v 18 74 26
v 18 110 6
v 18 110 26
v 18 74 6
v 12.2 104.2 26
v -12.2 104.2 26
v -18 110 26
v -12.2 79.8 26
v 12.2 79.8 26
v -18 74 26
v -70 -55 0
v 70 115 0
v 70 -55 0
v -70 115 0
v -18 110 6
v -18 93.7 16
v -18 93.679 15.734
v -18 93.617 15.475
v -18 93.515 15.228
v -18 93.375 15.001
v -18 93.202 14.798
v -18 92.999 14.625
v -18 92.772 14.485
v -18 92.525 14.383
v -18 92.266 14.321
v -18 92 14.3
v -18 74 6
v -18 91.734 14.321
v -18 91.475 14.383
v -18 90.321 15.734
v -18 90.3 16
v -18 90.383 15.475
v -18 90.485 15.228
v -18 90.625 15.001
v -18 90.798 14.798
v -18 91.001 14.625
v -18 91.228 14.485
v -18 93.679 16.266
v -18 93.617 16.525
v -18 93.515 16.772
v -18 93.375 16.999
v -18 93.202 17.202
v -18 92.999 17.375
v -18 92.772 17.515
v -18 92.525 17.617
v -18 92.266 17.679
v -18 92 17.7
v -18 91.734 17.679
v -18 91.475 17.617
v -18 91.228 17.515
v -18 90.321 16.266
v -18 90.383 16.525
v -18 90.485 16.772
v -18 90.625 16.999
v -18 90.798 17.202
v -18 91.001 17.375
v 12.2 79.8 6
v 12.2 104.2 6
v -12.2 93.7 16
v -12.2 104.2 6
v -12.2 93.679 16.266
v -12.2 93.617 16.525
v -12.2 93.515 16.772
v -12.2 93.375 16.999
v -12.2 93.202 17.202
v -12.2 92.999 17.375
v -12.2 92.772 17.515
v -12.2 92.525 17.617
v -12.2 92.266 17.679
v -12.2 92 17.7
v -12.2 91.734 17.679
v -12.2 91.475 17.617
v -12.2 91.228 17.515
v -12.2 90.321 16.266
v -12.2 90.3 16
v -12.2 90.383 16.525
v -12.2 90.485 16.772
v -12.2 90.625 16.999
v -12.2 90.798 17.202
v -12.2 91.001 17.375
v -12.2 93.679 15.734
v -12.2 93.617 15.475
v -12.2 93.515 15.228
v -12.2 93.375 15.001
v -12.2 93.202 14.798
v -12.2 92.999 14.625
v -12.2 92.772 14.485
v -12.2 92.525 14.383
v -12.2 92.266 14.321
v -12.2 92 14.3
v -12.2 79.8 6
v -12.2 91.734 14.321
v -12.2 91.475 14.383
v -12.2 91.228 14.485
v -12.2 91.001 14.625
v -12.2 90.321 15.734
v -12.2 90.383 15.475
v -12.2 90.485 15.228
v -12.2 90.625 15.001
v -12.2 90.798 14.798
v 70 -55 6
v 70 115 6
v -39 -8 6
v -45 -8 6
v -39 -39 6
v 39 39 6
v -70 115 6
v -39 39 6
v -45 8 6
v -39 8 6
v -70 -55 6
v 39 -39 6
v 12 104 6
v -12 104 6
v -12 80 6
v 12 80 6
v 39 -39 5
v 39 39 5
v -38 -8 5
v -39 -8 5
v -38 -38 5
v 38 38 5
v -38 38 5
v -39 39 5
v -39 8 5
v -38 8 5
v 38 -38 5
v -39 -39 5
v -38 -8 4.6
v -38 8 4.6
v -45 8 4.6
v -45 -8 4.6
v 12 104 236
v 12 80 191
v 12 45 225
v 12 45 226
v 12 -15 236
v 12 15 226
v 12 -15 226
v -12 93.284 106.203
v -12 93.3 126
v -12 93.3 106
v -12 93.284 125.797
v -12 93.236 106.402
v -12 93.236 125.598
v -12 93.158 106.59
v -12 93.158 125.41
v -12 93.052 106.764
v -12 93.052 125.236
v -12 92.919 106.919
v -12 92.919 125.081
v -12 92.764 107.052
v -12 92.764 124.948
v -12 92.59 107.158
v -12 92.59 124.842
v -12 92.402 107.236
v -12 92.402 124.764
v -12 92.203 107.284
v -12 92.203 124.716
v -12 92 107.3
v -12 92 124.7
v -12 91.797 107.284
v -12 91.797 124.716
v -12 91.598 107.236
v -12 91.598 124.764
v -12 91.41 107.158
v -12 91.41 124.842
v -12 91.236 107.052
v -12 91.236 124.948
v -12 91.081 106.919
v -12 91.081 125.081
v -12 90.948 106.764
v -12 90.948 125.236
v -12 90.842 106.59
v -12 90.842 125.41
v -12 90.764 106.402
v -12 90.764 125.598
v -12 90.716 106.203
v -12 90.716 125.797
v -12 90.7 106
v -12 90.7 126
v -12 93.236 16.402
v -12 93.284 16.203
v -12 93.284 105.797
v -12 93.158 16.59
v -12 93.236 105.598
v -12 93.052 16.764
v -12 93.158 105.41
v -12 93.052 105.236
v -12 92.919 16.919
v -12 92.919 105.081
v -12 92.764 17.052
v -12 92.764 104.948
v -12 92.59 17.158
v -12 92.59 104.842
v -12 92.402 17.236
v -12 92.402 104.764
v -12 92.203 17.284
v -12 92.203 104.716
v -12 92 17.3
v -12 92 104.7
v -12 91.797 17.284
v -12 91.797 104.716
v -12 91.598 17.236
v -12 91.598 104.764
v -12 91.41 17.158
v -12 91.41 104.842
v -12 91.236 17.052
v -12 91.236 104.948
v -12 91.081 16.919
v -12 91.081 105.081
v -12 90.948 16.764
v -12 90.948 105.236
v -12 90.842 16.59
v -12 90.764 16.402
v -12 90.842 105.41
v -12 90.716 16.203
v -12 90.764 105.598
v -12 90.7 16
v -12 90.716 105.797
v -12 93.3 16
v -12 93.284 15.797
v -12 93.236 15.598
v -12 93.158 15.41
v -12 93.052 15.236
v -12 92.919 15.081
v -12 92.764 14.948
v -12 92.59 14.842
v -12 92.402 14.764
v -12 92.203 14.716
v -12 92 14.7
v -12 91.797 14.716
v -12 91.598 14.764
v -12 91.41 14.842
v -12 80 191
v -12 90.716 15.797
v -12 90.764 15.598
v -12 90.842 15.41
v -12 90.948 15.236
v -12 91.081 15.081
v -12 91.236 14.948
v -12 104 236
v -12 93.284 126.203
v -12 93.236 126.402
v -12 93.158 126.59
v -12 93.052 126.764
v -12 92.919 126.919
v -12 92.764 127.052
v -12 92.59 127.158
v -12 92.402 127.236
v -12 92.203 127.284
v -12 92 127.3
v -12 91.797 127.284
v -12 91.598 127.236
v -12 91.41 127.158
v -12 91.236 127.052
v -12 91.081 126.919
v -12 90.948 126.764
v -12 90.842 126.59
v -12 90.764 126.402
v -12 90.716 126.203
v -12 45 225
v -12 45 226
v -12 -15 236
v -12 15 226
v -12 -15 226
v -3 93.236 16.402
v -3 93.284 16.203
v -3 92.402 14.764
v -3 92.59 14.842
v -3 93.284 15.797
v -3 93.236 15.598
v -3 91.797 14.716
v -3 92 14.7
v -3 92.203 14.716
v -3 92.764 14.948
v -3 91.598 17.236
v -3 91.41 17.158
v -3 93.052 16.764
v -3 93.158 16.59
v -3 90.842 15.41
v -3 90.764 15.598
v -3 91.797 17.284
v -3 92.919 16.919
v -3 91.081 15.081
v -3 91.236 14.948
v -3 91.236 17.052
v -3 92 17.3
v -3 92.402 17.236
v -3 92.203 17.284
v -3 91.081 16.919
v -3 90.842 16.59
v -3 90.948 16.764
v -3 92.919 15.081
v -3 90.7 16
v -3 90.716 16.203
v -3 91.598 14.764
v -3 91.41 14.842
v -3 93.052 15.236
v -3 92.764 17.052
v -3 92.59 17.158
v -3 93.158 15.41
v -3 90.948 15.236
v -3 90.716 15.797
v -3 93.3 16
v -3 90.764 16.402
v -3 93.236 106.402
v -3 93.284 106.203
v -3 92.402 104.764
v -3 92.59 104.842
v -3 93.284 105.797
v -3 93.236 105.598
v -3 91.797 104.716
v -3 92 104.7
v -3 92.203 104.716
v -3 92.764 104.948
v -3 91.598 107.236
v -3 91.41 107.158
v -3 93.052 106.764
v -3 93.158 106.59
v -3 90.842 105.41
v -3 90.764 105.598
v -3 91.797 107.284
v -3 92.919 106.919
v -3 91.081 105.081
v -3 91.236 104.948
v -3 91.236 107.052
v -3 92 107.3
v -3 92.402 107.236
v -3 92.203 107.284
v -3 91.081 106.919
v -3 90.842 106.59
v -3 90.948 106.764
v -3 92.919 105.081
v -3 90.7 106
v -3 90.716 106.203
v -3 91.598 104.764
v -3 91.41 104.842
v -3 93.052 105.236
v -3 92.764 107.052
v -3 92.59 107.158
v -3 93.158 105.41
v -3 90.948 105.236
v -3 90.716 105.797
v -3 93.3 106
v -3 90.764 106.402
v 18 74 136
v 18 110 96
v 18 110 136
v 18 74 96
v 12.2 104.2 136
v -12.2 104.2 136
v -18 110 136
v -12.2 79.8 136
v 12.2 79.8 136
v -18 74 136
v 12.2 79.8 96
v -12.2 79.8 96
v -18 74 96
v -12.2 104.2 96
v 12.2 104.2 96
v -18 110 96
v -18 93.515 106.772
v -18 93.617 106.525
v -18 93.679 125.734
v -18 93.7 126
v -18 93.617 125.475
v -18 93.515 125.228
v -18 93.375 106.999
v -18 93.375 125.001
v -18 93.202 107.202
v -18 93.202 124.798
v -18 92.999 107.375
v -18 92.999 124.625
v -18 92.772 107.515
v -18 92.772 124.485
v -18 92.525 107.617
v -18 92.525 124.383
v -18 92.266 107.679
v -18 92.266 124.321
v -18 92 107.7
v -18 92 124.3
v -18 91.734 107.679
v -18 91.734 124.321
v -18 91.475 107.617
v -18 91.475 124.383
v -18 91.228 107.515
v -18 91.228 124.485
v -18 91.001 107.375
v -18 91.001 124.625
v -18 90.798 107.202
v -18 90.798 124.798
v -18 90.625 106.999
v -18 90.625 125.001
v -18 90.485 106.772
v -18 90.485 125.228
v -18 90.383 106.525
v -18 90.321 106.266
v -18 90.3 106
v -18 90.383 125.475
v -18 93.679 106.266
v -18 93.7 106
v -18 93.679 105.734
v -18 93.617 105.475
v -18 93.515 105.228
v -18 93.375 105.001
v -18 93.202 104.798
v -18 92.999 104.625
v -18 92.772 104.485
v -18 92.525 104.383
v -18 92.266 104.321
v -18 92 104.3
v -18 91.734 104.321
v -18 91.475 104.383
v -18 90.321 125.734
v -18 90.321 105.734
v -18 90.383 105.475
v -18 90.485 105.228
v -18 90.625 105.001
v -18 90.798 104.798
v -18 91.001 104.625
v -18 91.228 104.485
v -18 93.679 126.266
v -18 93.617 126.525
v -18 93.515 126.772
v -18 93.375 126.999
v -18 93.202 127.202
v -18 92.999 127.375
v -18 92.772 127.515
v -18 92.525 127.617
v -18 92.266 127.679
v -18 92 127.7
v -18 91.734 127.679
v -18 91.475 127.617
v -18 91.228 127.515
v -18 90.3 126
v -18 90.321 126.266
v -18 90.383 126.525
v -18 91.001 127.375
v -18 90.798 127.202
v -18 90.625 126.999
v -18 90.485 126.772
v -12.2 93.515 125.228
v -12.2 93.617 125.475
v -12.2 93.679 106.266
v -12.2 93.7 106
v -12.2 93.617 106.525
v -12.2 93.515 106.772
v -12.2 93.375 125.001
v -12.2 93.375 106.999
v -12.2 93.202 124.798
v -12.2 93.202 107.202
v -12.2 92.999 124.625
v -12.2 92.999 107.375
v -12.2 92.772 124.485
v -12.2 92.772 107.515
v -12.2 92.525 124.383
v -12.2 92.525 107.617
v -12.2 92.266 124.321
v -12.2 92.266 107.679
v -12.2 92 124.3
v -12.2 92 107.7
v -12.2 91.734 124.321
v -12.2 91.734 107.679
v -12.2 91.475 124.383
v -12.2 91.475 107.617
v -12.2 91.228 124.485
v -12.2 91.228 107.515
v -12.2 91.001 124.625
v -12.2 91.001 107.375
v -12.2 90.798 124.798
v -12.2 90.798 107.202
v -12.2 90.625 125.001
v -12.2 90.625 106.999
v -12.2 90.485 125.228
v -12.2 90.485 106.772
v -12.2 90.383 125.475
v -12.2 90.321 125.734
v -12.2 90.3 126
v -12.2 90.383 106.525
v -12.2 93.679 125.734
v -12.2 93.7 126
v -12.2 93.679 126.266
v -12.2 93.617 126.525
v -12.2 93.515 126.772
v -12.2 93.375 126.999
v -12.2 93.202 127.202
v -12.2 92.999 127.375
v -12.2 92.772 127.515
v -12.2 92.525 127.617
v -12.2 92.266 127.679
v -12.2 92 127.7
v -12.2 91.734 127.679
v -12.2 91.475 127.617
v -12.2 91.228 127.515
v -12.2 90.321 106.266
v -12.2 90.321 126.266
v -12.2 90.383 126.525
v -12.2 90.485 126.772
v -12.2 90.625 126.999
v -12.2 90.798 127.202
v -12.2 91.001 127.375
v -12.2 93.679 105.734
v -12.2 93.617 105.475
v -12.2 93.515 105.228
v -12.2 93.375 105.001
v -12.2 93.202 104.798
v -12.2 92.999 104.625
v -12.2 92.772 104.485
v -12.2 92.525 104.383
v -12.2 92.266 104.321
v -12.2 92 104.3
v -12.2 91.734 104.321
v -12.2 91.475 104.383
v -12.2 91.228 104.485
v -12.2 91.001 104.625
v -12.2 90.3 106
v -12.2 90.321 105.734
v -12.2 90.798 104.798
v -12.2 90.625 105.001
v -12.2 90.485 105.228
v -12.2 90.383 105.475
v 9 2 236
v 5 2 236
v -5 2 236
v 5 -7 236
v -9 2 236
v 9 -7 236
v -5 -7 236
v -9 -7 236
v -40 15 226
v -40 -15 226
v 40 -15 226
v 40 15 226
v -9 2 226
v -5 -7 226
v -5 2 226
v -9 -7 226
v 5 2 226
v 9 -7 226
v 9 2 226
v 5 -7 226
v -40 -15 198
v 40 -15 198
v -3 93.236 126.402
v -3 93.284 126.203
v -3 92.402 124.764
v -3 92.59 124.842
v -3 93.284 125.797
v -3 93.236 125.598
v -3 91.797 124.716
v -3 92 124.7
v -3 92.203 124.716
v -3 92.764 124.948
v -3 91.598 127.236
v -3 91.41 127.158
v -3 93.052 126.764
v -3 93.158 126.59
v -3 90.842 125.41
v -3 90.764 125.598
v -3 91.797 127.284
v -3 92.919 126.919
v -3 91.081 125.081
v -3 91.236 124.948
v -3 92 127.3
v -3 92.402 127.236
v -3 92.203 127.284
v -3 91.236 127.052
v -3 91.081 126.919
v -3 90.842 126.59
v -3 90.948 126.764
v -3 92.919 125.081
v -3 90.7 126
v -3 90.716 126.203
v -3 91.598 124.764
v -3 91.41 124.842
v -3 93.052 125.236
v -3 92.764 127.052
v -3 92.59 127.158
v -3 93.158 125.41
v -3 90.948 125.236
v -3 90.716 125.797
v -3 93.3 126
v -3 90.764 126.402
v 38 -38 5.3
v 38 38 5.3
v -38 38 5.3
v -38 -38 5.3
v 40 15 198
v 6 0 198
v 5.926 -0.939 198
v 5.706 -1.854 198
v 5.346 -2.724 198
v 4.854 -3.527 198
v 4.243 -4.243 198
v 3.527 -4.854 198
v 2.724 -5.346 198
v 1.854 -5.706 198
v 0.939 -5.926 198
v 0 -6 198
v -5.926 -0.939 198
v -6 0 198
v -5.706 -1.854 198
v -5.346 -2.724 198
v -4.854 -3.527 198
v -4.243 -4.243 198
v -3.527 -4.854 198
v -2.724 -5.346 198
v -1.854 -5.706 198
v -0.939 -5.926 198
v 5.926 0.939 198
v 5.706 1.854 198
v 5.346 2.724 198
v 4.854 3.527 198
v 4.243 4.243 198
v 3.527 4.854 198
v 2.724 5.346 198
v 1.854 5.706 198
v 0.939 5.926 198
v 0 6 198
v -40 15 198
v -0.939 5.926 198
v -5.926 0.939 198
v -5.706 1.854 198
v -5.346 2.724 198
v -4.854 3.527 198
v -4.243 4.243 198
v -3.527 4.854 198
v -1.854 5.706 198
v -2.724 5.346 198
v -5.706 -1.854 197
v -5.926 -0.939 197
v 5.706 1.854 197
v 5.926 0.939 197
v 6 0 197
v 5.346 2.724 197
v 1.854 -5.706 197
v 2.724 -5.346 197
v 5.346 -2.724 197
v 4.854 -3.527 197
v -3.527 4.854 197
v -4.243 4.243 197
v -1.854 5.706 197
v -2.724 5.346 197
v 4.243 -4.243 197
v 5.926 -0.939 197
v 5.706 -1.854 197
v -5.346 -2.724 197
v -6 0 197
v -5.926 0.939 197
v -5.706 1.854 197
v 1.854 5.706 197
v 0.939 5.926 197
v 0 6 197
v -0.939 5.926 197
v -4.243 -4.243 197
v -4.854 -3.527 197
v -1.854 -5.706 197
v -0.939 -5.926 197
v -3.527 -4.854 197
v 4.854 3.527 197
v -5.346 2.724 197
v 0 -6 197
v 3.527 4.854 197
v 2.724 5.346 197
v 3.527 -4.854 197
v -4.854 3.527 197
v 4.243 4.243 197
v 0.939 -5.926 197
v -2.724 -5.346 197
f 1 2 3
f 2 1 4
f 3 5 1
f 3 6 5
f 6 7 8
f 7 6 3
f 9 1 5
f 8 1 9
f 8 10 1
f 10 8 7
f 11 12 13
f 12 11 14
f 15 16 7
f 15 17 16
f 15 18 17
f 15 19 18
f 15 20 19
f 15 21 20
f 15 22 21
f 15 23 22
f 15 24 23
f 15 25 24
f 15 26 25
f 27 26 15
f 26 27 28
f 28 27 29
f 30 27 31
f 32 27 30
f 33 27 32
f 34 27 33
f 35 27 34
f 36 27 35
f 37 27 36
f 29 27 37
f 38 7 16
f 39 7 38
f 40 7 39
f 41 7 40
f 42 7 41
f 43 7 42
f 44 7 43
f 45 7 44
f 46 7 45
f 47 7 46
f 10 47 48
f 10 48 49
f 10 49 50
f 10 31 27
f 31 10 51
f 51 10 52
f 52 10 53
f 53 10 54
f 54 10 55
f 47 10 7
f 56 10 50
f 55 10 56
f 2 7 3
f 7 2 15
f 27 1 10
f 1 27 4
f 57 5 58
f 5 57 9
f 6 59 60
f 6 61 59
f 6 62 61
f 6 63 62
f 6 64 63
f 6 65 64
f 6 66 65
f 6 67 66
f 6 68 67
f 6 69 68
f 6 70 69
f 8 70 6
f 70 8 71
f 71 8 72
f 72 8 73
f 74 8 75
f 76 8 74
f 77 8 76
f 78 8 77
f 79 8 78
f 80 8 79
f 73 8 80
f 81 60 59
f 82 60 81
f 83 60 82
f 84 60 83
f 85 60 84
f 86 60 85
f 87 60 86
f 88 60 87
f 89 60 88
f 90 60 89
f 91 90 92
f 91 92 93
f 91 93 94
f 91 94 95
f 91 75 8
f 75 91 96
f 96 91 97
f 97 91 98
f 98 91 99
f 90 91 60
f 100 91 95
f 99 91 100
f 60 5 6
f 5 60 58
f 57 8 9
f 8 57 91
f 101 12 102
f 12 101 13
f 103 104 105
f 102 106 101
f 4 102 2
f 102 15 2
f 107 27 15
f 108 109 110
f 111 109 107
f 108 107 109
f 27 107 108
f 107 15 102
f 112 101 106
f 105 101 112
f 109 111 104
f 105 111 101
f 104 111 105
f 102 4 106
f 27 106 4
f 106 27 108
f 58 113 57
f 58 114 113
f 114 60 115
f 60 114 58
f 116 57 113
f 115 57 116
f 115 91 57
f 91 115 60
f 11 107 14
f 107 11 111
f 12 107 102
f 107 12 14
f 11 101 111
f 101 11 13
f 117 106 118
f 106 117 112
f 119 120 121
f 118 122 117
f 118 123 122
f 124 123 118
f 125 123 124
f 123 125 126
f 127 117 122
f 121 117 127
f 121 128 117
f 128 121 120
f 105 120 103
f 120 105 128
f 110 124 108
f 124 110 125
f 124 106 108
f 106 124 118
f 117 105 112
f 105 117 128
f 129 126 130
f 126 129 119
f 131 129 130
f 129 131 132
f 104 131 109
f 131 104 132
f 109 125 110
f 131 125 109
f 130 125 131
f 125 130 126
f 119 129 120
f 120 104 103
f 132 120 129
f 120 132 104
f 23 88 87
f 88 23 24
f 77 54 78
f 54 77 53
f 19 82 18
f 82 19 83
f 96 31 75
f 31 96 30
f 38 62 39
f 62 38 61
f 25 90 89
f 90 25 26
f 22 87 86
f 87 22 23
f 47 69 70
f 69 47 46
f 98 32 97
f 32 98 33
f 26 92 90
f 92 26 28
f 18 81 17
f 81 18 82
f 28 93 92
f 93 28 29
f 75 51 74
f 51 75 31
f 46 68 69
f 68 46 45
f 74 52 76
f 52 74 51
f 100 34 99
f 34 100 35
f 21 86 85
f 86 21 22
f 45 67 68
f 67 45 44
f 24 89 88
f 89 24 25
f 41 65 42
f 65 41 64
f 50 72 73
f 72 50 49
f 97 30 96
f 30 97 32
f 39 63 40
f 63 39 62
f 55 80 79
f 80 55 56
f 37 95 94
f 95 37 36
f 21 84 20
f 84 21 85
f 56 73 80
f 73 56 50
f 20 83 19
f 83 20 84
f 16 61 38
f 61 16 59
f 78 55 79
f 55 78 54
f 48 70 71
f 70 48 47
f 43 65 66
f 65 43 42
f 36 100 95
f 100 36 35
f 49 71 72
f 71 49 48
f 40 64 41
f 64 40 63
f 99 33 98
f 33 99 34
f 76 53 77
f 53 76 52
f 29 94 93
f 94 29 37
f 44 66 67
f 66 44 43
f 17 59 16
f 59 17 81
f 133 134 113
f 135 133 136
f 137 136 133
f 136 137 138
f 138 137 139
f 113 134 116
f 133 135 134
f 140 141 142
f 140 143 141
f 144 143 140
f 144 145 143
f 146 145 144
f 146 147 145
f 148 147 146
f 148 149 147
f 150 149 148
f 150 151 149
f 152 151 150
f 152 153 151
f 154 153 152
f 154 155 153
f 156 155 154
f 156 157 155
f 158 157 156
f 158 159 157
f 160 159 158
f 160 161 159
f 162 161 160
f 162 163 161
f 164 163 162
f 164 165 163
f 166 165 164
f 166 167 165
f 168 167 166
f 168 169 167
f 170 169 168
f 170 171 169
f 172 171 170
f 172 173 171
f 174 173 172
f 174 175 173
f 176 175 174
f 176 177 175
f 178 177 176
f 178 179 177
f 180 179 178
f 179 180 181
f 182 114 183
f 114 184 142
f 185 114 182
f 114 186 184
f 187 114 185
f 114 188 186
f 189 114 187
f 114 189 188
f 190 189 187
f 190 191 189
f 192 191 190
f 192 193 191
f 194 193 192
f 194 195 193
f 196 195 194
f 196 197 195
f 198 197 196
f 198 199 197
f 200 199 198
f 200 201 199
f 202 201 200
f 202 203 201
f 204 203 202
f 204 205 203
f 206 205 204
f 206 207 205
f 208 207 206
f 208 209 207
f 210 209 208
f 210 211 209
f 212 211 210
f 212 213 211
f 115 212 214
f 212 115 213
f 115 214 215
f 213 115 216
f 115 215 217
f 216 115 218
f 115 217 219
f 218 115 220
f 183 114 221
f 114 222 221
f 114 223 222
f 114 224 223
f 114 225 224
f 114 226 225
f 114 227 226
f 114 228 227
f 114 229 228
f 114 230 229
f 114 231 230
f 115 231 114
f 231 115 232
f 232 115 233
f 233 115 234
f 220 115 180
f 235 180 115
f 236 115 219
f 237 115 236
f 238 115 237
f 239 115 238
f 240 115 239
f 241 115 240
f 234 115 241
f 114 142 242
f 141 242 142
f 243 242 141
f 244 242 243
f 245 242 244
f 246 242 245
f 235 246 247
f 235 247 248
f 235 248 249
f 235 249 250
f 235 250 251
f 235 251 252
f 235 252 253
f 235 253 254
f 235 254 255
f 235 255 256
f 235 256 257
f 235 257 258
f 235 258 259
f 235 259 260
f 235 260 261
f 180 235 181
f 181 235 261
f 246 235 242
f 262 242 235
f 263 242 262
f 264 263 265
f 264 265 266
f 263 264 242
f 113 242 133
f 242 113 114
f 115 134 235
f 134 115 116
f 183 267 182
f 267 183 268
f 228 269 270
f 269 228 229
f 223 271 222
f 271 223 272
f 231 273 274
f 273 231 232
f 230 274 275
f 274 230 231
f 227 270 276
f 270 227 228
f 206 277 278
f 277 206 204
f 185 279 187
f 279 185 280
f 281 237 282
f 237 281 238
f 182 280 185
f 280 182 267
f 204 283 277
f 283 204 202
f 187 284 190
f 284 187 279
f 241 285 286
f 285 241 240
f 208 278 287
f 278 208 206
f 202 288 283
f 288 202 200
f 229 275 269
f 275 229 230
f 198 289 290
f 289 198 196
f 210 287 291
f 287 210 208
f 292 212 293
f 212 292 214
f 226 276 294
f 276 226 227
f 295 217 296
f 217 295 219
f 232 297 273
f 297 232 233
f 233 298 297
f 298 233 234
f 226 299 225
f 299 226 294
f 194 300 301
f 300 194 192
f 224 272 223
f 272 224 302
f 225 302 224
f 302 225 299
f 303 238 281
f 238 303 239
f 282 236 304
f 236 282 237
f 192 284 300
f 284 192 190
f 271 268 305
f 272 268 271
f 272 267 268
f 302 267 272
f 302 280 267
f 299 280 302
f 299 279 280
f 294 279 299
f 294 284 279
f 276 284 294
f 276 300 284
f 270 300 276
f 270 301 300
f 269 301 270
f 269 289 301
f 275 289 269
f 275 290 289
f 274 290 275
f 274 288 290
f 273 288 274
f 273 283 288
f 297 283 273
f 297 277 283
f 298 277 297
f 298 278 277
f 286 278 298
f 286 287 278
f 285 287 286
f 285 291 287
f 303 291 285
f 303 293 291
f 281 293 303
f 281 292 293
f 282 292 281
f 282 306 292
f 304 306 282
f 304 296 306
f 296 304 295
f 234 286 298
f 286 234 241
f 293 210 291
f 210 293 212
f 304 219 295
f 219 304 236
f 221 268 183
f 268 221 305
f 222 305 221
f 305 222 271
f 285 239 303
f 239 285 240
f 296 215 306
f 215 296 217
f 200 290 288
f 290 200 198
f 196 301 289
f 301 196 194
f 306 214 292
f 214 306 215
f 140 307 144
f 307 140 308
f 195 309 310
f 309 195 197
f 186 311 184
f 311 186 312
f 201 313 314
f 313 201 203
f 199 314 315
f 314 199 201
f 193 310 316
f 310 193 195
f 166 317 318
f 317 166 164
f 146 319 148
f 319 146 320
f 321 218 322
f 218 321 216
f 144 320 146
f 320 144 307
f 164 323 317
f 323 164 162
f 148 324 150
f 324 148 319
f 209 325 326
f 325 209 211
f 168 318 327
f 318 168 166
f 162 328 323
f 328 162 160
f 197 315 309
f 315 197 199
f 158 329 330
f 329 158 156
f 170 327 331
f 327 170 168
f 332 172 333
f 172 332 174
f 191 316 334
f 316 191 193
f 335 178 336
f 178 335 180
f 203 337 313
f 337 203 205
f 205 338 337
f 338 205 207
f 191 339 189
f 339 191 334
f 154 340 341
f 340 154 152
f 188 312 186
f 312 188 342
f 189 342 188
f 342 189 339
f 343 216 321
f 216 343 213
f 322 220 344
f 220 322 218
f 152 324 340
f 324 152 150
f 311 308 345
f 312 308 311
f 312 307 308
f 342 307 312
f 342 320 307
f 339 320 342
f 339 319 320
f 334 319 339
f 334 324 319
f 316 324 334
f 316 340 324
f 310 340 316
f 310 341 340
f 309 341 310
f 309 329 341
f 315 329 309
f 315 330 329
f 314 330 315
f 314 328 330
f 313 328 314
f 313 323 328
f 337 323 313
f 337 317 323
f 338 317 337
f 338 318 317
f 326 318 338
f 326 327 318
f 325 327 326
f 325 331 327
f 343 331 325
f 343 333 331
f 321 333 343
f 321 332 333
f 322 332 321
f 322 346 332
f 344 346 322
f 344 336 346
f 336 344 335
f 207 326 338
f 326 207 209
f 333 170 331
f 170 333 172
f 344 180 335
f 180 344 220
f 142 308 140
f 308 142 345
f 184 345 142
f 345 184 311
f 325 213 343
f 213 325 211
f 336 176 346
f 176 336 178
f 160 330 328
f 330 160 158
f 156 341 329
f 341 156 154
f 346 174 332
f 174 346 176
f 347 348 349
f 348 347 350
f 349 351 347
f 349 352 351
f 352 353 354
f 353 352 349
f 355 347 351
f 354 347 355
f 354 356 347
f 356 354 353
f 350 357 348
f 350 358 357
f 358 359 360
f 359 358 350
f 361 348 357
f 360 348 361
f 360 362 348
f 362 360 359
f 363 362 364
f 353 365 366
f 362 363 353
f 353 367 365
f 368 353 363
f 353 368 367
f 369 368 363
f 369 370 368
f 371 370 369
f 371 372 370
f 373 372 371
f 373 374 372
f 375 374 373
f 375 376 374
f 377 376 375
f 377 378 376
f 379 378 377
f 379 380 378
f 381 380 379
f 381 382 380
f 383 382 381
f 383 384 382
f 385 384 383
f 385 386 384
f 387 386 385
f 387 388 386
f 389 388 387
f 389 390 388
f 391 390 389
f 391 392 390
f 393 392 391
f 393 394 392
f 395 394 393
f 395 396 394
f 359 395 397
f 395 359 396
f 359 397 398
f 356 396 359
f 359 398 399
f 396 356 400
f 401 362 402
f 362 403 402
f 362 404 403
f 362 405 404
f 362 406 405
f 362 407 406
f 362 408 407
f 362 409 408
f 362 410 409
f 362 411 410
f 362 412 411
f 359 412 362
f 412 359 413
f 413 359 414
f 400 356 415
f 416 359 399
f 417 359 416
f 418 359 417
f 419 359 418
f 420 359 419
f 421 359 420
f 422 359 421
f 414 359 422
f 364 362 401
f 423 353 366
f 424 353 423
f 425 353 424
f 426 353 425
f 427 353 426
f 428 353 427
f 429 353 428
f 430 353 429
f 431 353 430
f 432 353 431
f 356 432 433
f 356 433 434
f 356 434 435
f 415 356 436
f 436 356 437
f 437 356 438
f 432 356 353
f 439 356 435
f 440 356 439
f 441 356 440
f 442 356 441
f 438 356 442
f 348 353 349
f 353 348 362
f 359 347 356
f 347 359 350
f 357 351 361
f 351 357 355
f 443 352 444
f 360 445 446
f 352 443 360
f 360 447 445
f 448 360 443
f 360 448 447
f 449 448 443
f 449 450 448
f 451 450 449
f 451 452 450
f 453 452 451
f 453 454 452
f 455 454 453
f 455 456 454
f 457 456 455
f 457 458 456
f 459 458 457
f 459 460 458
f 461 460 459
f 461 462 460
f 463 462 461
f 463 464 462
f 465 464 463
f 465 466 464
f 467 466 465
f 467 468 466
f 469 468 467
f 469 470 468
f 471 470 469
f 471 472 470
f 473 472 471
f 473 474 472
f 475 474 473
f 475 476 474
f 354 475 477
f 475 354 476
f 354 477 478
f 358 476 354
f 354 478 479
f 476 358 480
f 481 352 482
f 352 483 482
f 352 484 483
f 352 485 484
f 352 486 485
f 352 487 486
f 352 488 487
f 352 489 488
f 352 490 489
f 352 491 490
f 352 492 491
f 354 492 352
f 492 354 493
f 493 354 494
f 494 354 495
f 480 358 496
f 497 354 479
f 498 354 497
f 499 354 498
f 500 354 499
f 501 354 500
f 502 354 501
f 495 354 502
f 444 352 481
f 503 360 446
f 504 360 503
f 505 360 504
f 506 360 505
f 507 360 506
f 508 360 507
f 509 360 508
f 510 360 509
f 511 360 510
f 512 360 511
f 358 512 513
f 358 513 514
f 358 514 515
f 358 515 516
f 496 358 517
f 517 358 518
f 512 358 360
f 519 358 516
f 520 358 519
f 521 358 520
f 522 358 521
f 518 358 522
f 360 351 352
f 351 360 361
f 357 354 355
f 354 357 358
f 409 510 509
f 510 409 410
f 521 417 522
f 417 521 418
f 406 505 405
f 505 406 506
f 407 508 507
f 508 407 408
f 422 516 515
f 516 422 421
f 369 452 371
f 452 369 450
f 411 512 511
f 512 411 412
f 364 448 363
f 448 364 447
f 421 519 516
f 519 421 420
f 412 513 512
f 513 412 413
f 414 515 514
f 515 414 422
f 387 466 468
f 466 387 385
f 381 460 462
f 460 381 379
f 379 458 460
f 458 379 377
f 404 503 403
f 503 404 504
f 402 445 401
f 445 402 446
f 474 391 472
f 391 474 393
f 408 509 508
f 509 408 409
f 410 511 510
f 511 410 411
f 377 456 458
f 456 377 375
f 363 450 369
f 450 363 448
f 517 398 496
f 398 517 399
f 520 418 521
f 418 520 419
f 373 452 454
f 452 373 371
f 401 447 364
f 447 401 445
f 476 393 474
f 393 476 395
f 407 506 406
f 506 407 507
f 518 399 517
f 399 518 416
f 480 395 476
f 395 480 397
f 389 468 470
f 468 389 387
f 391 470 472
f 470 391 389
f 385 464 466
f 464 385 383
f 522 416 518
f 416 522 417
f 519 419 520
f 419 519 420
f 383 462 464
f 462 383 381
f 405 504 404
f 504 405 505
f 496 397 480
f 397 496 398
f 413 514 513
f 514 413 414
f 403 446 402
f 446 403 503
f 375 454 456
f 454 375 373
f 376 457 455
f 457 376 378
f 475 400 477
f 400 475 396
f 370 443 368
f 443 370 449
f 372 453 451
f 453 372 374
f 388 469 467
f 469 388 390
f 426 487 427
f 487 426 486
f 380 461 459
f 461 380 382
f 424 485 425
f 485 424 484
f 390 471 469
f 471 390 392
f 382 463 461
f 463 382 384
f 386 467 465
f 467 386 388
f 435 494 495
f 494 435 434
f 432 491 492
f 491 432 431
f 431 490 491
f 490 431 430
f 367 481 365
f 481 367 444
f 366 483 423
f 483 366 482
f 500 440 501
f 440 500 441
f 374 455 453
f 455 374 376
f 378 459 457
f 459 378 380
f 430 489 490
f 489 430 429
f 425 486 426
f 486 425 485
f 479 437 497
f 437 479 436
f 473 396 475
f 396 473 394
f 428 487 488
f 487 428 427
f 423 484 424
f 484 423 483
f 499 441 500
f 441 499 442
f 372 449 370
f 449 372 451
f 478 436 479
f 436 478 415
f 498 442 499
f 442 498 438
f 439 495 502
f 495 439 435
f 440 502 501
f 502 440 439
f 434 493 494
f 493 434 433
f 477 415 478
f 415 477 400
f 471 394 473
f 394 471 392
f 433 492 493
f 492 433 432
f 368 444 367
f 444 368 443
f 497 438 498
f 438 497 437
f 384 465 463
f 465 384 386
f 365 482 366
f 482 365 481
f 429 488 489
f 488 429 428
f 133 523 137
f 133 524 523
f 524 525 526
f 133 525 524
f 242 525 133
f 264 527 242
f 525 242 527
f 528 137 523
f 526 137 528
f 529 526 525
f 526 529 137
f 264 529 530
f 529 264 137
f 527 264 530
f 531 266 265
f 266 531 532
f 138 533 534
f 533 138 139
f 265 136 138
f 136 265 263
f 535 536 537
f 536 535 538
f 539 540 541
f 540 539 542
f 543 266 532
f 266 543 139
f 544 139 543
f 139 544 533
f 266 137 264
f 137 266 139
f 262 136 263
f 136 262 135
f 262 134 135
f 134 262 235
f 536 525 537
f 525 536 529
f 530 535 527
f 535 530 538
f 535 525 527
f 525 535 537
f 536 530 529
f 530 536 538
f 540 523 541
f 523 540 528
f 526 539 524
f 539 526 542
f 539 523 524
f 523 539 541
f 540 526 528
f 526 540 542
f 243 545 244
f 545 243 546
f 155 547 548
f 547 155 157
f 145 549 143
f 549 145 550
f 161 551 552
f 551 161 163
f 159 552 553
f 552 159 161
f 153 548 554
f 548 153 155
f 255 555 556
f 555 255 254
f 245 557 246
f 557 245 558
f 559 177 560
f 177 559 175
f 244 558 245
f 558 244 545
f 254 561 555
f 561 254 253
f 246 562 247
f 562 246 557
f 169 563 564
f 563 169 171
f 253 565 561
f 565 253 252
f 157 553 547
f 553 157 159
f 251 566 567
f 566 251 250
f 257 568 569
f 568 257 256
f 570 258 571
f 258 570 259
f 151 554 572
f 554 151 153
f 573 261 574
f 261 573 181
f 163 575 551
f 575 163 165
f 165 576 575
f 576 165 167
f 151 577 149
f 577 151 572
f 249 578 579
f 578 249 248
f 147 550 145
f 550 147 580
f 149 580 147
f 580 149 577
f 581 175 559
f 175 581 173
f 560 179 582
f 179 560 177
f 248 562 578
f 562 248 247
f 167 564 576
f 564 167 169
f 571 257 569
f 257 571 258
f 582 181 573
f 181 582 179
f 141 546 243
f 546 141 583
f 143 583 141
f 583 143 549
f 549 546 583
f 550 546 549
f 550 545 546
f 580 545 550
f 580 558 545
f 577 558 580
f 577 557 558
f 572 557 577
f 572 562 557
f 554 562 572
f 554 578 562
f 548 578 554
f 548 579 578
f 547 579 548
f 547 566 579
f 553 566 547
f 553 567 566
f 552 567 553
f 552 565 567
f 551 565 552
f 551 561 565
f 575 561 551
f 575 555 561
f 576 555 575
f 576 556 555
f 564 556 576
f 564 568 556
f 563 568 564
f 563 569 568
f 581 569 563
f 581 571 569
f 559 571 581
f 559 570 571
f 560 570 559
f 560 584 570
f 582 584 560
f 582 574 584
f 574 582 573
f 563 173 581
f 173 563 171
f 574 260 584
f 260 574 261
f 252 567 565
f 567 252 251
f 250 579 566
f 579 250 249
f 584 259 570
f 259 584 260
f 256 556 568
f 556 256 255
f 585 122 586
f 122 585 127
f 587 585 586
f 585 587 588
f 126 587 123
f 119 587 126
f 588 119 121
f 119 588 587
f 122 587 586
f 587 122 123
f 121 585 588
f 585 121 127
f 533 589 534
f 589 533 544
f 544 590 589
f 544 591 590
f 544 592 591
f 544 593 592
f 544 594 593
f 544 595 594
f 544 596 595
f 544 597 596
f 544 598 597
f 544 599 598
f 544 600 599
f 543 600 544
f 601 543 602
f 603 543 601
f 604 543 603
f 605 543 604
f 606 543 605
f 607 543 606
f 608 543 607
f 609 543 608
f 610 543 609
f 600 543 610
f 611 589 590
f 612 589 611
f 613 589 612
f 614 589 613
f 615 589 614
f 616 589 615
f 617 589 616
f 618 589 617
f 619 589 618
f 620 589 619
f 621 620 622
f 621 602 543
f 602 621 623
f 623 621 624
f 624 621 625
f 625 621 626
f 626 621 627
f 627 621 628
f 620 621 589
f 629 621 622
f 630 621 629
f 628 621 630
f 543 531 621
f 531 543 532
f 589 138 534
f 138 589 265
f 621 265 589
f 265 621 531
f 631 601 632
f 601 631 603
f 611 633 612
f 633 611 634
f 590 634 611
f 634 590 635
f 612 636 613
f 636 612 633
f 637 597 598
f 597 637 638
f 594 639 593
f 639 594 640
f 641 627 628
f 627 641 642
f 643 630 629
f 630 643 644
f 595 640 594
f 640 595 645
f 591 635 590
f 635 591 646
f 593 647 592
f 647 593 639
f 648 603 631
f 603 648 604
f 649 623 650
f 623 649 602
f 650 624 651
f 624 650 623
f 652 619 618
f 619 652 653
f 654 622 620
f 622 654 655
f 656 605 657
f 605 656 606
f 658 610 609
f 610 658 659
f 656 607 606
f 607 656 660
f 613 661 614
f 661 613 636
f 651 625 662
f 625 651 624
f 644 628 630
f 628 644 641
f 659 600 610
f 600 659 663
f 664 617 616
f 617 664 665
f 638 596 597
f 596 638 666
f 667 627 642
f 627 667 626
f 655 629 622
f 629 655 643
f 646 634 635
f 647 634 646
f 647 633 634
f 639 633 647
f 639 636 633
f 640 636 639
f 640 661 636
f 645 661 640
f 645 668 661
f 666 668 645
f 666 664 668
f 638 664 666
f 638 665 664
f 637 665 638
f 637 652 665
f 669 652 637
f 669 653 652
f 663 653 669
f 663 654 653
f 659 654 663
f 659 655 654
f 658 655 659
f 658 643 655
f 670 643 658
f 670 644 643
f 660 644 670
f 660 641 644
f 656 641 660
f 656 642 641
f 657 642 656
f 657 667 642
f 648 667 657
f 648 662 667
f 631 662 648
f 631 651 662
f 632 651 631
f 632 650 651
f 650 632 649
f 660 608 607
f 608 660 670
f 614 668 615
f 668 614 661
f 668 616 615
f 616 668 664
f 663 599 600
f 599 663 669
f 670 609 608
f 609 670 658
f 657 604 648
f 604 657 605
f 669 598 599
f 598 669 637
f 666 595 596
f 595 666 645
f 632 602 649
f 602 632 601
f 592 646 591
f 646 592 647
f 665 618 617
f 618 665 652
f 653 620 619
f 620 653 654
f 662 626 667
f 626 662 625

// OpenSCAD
// Scribbot camera stand: holds a webcam (Logitech Brio 101) about 19 cm above a sticky note.
// The webcam's own monitor clip grips the end of the top arm. The camera hangs underneath, looking down.
// Parts (print one of each, no supports):
//   21 foot      note pocket + socket for the column (print flat)
//   22 column    lower column (print standing up)
//   23 coupler   joins the column to the top arm (print standing up)
//   24 top_arm   upright + arm, printed lying on its side
// Hardware: 4 x M3 x 12 screws (same as the arm) screwed into the printed columns, 2 zip ties.
part="assembly";
$fn=40;

C=24;          // column square
FIT=0.4;       // socket clearance
NOTE=78;       // pocket for a 76 mm note
COL_Y=92;      // column center, behind the note center
LOW_H=110;     // lower column
SOCK=20;       // socket depth
UP_H=120;      // upright of the top arm
ARM_T=10;      // the "monitor edge" thickness the clip grips
ARM_END=-15;   // arm end edge (y). The camera hangs between here and about y = +15, lens near y = 0.

// Through the socket wall from the -x side (clearance)...
module m3_cross(z){ translate([-C/2-7,0,z]) rotate([0,90,0]) cylinder(d=3.4,h=7.5); }
// ...and into the column (pilot hole, the screw cuts its own thread).
module m3_pilot(z){ translate([-C/2-1,0,z]) rotate([0,90,0]) cylinder(d=2.6,h=10); }

module socket_block(h){
  difference(){
    translate([-C/2-6,-C/2-6,0]) cube([C+12,C+12,h]);
    translate([-(C+FIT)/2,-(C+FIT)/2,-1]) cube([C+FIT,C+FIT,h+2]);
  }
}

module foot(){
  difference(){
    union(){
      translate([-70,-55,0]) cube([140,170,6]);
      translate([0,COL_Y,0]) socket_block(6+SOCK);
    }
    translate([-NOTE/2,-NOTE/2,5]) cube([NOTE,NOTE,2]);              // 1 mm deep note pocket
    translate([-NOTE/2-6,-8,4.6]) cube([7,16,2]);                    // finger notch to lift the note
    translate([0,COL_Y,6+SOCK/2]) m3_cross(0);
  }
  translate([0,COL_Y,0]) translate([-C/2-6,-C/2-6,0]) cube([C+12,C+12,6]);   // socket floor
}

module column(){            // standing, centered, z = 0 at the bottom
  difference(){
    translate([-C/2,-C/2,0]) cube([C,C,LOW_H]);
    m3_pilot(SOCK/2);
    m3_pilot(LOW_H-SOCK/2);
  }
}

module coupler(){ difference(){ socket_block(2*SOCK); m3_cross(SOCK/2); m3_cross(1.5*SOCK); } }

module top_arm_standing(){  // column axis at (0,0), bottom at z = 0
  L=COL_Y-ARM_END;
  difference(){
    union(){
      translate([-C/2,-C/2,0]) cube([C,C,UP_H]);
      translate([-C/2,-L,UP_H-ARM_T]) cube([C,L+C/2,ARM_T]);              // arm toward the note
      hull(){                                                            // gusset
        translate([-C/2,-C/2,UP_H-ARM_T-35]) cube([C,1,35]);
        translate([-C/2,-C/2-35,UP_H-ARM_T-1]) cube([C,35,1]);
      }
    }
    m3_pilot(SOCK/2);
    for(x=[-C/2+3,C/2-7]) translate([x,-L+8,UP_H-ARM_T-1]) cube([4,9,ARM_T+2]);   // zip-tie slots
  }
}

// Lying on its side: standing x becomes print z. All parts of it are C wide, so it sits flat.
module top_arm_print(){ translate([0,0,C/2]) rotate([0,90,0]) top_arm_standing(); }

Z_TOP=6+LOW_H;                                  // top of the lower column
module assembly(){
  color("white") foot();
  color("lightgray") translate([0,COL_Y,6]) column();
  color("silver") translate([0,COL_Y,Z_TOP-SOCK]) coupler();
  color("gainsboro") translate([0,COL_Y,Z_TOP]) top_arm_standing();
  color("#f6e27a") translate([-38,-38,5]) cube([76,76,0.3]);           // sticky note
  // webcam stand-in: hangs under the arm end, lens down
  color("#222") translate([-40,ARM_END,Z_TOP+UP_H-ARM_T-28]) cube([80,30,28]);
  color("#555") translate([0,ARM_END+15,Z_TOP+UP_H-ARM_T-29]) cylinder(d=12,h=2);
}

if(part=="assembly") assembly();
if(part=="foot") foot();
if(part=="column") column();
if(part=="coupler") coupler();
if(part=="top_arm") top_arm_print();
